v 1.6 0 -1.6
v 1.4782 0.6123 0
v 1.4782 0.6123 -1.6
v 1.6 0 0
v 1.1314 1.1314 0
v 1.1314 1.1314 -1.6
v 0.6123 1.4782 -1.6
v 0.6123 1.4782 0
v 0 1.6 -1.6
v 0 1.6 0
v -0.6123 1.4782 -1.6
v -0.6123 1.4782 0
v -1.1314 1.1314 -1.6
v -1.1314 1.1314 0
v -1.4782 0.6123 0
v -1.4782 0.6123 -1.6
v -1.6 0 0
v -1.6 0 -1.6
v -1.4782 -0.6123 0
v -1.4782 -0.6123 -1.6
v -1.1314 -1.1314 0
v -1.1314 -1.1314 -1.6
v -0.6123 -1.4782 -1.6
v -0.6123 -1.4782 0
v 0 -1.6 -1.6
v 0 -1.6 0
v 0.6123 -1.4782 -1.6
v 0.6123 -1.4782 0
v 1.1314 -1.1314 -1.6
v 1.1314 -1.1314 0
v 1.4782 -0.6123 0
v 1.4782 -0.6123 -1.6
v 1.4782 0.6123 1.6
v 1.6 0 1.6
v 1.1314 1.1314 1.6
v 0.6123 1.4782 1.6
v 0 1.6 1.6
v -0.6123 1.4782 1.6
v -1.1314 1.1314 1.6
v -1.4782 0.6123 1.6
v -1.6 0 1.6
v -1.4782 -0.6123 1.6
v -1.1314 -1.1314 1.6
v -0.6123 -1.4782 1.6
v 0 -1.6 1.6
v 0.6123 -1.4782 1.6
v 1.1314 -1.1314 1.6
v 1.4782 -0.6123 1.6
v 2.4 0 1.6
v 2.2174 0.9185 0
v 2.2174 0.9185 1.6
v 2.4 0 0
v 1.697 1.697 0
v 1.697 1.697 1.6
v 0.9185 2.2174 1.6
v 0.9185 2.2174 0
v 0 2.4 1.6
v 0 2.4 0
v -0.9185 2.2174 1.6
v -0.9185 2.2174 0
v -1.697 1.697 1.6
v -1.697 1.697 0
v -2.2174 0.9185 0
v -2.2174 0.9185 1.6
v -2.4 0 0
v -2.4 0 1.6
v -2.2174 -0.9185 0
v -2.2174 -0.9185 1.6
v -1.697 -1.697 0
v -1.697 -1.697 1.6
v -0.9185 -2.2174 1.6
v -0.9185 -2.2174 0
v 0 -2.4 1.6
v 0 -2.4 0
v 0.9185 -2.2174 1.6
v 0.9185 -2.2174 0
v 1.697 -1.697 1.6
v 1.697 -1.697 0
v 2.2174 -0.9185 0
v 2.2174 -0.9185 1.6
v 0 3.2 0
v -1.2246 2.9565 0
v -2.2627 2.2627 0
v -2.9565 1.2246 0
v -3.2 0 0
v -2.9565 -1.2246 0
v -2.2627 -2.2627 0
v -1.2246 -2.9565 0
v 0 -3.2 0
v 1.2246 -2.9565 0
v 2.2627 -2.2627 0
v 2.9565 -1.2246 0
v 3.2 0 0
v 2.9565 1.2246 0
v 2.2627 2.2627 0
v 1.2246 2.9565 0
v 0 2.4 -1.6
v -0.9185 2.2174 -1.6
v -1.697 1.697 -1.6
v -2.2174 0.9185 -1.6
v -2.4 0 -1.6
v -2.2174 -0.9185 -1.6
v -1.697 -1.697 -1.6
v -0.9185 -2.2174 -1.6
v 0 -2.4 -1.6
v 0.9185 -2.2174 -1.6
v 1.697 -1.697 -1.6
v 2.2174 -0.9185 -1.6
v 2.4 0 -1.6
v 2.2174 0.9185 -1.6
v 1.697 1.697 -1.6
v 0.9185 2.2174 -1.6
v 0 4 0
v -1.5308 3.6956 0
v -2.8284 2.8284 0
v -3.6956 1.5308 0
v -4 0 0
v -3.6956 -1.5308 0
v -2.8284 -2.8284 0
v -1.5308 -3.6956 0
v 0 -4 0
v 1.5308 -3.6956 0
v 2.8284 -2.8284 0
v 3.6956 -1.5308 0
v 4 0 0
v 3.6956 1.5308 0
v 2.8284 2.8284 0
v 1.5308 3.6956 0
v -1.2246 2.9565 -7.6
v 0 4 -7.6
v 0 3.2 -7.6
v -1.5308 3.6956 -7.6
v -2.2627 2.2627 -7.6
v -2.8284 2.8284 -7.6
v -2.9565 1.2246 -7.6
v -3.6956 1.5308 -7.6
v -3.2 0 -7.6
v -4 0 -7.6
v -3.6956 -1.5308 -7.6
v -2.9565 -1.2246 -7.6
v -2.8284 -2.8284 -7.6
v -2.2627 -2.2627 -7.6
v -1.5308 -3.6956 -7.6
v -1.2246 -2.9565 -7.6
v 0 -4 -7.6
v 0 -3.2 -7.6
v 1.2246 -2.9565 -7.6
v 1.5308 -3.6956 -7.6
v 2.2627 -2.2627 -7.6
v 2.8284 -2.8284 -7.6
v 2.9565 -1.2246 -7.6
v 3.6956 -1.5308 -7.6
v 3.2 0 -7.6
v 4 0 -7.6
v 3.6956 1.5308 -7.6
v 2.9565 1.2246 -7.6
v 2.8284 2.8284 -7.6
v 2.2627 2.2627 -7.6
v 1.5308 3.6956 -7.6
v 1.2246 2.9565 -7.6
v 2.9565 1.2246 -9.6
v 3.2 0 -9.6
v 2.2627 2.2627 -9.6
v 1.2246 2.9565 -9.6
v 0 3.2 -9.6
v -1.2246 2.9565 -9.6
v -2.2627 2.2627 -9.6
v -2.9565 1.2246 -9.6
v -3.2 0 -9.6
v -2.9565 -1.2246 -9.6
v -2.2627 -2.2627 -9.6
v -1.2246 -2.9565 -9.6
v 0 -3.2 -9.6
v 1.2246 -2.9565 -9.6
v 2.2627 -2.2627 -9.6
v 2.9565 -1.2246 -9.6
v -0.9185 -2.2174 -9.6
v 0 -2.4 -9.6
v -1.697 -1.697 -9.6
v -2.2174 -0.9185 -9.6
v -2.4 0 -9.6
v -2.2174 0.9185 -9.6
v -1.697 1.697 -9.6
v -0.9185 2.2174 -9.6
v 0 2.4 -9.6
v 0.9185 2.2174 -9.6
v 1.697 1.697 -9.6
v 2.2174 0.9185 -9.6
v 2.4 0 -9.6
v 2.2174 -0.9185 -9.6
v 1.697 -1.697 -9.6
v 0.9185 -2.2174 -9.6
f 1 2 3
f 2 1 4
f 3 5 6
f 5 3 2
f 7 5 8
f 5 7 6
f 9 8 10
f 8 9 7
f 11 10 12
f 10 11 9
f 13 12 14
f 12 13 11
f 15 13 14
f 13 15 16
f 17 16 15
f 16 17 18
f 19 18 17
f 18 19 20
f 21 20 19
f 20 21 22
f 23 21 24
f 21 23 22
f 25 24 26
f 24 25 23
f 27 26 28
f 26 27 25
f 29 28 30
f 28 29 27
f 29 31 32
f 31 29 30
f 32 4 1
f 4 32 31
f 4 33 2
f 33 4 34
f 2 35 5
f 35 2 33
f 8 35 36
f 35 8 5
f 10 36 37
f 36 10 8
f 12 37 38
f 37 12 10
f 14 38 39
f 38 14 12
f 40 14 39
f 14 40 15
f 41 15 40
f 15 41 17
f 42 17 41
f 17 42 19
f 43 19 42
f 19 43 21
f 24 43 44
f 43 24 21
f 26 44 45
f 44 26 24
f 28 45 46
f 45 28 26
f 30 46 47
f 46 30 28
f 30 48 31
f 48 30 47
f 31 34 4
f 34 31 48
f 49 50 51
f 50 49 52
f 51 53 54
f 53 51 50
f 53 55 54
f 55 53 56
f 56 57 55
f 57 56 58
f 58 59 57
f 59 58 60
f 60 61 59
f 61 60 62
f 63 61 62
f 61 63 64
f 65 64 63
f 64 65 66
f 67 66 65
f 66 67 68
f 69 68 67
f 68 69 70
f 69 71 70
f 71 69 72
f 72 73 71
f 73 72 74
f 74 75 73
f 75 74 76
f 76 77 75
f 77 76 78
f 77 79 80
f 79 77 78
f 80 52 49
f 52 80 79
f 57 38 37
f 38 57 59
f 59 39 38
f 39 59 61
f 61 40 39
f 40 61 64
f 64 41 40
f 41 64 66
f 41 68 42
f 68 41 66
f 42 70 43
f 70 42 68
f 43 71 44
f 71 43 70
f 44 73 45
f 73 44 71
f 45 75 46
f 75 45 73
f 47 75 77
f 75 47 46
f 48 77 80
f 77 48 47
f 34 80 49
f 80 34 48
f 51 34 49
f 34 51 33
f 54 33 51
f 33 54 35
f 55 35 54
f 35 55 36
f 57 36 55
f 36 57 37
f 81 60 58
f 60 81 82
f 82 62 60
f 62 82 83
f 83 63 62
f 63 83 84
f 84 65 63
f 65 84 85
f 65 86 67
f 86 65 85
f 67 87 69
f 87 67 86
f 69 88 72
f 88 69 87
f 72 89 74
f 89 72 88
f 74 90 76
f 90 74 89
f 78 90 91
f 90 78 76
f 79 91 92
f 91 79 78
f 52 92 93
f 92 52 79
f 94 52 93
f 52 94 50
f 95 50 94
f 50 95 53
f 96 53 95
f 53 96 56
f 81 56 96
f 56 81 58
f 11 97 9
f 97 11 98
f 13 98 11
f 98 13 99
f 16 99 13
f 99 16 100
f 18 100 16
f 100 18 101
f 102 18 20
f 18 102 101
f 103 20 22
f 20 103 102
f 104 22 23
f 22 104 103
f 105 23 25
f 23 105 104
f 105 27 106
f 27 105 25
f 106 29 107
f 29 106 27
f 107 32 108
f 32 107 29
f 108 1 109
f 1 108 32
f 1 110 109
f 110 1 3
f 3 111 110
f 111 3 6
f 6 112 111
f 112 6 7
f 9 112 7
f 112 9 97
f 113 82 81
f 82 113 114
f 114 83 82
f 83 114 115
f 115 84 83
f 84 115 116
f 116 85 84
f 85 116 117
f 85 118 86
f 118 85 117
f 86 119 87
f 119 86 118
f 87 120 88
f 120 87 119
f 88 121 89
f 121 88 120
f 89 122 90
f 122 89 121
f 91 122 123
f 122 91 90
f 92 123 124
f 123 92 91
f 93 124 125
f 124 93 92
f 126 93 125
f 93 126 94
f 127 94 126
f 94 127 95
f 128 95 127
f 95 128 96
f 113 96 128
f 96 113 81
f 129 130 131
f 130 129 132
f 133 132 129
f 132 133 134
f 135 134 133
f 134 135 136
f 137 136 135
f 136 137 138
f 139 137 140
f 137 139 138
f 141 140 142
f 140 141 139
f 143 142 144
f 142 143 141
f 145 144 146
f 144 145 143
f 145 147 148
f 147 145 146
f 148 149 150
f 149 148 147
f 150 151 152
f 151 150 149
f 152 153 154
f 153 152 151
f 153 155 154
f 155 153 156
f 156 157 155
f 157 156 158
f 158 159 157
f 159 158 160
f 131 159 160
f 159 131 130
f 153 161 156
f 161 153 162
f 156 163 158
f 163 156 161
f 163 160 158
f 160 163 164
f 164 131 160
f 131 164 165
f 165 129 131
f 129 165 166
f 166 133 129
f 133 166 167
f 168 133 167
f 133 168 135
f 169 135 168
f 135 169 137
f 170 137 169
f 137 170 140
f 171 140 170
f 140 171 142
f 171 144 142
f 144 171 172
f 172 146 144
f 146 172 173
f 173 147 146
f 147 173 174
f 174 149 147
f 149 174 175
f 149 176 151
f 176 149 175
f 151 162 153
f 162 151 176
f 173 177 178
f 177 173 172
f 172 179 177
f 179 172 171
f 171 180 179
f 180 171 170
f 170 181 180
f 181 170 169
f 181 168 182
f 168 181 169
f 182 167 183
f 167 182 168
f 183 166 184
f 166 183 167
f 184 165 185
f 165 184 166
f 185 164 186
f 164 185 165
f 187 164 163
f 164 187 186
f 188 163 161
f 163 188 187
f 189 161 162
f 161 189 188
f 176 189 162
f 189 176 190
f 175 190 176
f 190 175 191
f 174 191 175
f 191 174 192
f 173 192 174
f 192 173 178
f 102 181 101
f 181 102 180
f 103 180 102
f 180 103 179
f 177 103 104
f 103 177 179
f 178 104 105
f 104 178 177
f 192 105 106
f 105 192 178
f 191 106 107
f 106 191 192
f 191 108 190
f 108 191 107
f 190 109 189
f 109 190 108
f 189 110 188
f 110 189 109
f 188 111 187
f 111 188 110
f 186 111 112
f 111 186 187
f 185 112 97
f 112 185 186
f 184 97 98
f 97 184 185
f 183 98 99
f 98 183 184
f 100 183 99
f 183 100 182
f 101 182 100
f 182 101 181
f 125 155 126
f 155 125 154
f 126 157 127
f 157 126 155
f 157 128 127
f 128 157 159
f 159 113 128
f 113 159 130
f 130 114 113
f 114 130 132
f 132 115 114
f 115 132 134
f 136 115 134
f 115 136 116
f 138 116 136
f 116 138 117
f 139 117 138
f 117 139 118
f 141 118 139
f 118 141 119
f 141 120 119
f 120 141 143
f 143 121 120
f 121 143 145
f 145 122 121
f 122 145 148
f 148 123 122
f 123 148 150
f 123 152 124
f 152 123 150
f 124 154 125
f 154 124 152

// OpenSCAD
use <../lib.scad>
use <3062b.scad>
$fa=1; $fs=0.2;
function ldraw_lib__28(realsolid=false) = [
// 0 ~Moved to 3062b
// 0 Name: 28.dat
// 0 Author: [PTadmin]
// 0 !LDRAW_ORG Part UPDATE 1998-07
// 0 !LICENSE Licensed under CC BY 4.0 : see CAreadme.txt
// 
// 0 BFC CERTIFY CCW
  [0,"BFC","CERTIFY"],
  [0,"BFC","CCW"],
// 
// 0 !HISTORY 1998-07-15 [PTadmin] Official Update 1998-07
// 0 !HISTORY 2007-05-18 [PTadmin] Header formatted for Contributor Agreement
// 0 !HISTORY 2008-07-01 [PTadmin] Official Update 2008-01
// 
// 
// 1 16 0 0 0 1 0 0 0 1 0 0 0 1 3062b.dat
  [1,16,0,0,0,1,0,0,0,1,0,0,0,1, ldraw_lib__3062b(realsolid)],
// 
];
module ldraw_lib__28(step=0, col=false, unit=2/5, alt=false, line=0.2, solid=!$preview)
    makepoly(ldraw_lib__28(solid), step=step, col=col, unit=unit, alt=alt, line=line, solid=solid);
ldraw_lib__28(line=0.2);
